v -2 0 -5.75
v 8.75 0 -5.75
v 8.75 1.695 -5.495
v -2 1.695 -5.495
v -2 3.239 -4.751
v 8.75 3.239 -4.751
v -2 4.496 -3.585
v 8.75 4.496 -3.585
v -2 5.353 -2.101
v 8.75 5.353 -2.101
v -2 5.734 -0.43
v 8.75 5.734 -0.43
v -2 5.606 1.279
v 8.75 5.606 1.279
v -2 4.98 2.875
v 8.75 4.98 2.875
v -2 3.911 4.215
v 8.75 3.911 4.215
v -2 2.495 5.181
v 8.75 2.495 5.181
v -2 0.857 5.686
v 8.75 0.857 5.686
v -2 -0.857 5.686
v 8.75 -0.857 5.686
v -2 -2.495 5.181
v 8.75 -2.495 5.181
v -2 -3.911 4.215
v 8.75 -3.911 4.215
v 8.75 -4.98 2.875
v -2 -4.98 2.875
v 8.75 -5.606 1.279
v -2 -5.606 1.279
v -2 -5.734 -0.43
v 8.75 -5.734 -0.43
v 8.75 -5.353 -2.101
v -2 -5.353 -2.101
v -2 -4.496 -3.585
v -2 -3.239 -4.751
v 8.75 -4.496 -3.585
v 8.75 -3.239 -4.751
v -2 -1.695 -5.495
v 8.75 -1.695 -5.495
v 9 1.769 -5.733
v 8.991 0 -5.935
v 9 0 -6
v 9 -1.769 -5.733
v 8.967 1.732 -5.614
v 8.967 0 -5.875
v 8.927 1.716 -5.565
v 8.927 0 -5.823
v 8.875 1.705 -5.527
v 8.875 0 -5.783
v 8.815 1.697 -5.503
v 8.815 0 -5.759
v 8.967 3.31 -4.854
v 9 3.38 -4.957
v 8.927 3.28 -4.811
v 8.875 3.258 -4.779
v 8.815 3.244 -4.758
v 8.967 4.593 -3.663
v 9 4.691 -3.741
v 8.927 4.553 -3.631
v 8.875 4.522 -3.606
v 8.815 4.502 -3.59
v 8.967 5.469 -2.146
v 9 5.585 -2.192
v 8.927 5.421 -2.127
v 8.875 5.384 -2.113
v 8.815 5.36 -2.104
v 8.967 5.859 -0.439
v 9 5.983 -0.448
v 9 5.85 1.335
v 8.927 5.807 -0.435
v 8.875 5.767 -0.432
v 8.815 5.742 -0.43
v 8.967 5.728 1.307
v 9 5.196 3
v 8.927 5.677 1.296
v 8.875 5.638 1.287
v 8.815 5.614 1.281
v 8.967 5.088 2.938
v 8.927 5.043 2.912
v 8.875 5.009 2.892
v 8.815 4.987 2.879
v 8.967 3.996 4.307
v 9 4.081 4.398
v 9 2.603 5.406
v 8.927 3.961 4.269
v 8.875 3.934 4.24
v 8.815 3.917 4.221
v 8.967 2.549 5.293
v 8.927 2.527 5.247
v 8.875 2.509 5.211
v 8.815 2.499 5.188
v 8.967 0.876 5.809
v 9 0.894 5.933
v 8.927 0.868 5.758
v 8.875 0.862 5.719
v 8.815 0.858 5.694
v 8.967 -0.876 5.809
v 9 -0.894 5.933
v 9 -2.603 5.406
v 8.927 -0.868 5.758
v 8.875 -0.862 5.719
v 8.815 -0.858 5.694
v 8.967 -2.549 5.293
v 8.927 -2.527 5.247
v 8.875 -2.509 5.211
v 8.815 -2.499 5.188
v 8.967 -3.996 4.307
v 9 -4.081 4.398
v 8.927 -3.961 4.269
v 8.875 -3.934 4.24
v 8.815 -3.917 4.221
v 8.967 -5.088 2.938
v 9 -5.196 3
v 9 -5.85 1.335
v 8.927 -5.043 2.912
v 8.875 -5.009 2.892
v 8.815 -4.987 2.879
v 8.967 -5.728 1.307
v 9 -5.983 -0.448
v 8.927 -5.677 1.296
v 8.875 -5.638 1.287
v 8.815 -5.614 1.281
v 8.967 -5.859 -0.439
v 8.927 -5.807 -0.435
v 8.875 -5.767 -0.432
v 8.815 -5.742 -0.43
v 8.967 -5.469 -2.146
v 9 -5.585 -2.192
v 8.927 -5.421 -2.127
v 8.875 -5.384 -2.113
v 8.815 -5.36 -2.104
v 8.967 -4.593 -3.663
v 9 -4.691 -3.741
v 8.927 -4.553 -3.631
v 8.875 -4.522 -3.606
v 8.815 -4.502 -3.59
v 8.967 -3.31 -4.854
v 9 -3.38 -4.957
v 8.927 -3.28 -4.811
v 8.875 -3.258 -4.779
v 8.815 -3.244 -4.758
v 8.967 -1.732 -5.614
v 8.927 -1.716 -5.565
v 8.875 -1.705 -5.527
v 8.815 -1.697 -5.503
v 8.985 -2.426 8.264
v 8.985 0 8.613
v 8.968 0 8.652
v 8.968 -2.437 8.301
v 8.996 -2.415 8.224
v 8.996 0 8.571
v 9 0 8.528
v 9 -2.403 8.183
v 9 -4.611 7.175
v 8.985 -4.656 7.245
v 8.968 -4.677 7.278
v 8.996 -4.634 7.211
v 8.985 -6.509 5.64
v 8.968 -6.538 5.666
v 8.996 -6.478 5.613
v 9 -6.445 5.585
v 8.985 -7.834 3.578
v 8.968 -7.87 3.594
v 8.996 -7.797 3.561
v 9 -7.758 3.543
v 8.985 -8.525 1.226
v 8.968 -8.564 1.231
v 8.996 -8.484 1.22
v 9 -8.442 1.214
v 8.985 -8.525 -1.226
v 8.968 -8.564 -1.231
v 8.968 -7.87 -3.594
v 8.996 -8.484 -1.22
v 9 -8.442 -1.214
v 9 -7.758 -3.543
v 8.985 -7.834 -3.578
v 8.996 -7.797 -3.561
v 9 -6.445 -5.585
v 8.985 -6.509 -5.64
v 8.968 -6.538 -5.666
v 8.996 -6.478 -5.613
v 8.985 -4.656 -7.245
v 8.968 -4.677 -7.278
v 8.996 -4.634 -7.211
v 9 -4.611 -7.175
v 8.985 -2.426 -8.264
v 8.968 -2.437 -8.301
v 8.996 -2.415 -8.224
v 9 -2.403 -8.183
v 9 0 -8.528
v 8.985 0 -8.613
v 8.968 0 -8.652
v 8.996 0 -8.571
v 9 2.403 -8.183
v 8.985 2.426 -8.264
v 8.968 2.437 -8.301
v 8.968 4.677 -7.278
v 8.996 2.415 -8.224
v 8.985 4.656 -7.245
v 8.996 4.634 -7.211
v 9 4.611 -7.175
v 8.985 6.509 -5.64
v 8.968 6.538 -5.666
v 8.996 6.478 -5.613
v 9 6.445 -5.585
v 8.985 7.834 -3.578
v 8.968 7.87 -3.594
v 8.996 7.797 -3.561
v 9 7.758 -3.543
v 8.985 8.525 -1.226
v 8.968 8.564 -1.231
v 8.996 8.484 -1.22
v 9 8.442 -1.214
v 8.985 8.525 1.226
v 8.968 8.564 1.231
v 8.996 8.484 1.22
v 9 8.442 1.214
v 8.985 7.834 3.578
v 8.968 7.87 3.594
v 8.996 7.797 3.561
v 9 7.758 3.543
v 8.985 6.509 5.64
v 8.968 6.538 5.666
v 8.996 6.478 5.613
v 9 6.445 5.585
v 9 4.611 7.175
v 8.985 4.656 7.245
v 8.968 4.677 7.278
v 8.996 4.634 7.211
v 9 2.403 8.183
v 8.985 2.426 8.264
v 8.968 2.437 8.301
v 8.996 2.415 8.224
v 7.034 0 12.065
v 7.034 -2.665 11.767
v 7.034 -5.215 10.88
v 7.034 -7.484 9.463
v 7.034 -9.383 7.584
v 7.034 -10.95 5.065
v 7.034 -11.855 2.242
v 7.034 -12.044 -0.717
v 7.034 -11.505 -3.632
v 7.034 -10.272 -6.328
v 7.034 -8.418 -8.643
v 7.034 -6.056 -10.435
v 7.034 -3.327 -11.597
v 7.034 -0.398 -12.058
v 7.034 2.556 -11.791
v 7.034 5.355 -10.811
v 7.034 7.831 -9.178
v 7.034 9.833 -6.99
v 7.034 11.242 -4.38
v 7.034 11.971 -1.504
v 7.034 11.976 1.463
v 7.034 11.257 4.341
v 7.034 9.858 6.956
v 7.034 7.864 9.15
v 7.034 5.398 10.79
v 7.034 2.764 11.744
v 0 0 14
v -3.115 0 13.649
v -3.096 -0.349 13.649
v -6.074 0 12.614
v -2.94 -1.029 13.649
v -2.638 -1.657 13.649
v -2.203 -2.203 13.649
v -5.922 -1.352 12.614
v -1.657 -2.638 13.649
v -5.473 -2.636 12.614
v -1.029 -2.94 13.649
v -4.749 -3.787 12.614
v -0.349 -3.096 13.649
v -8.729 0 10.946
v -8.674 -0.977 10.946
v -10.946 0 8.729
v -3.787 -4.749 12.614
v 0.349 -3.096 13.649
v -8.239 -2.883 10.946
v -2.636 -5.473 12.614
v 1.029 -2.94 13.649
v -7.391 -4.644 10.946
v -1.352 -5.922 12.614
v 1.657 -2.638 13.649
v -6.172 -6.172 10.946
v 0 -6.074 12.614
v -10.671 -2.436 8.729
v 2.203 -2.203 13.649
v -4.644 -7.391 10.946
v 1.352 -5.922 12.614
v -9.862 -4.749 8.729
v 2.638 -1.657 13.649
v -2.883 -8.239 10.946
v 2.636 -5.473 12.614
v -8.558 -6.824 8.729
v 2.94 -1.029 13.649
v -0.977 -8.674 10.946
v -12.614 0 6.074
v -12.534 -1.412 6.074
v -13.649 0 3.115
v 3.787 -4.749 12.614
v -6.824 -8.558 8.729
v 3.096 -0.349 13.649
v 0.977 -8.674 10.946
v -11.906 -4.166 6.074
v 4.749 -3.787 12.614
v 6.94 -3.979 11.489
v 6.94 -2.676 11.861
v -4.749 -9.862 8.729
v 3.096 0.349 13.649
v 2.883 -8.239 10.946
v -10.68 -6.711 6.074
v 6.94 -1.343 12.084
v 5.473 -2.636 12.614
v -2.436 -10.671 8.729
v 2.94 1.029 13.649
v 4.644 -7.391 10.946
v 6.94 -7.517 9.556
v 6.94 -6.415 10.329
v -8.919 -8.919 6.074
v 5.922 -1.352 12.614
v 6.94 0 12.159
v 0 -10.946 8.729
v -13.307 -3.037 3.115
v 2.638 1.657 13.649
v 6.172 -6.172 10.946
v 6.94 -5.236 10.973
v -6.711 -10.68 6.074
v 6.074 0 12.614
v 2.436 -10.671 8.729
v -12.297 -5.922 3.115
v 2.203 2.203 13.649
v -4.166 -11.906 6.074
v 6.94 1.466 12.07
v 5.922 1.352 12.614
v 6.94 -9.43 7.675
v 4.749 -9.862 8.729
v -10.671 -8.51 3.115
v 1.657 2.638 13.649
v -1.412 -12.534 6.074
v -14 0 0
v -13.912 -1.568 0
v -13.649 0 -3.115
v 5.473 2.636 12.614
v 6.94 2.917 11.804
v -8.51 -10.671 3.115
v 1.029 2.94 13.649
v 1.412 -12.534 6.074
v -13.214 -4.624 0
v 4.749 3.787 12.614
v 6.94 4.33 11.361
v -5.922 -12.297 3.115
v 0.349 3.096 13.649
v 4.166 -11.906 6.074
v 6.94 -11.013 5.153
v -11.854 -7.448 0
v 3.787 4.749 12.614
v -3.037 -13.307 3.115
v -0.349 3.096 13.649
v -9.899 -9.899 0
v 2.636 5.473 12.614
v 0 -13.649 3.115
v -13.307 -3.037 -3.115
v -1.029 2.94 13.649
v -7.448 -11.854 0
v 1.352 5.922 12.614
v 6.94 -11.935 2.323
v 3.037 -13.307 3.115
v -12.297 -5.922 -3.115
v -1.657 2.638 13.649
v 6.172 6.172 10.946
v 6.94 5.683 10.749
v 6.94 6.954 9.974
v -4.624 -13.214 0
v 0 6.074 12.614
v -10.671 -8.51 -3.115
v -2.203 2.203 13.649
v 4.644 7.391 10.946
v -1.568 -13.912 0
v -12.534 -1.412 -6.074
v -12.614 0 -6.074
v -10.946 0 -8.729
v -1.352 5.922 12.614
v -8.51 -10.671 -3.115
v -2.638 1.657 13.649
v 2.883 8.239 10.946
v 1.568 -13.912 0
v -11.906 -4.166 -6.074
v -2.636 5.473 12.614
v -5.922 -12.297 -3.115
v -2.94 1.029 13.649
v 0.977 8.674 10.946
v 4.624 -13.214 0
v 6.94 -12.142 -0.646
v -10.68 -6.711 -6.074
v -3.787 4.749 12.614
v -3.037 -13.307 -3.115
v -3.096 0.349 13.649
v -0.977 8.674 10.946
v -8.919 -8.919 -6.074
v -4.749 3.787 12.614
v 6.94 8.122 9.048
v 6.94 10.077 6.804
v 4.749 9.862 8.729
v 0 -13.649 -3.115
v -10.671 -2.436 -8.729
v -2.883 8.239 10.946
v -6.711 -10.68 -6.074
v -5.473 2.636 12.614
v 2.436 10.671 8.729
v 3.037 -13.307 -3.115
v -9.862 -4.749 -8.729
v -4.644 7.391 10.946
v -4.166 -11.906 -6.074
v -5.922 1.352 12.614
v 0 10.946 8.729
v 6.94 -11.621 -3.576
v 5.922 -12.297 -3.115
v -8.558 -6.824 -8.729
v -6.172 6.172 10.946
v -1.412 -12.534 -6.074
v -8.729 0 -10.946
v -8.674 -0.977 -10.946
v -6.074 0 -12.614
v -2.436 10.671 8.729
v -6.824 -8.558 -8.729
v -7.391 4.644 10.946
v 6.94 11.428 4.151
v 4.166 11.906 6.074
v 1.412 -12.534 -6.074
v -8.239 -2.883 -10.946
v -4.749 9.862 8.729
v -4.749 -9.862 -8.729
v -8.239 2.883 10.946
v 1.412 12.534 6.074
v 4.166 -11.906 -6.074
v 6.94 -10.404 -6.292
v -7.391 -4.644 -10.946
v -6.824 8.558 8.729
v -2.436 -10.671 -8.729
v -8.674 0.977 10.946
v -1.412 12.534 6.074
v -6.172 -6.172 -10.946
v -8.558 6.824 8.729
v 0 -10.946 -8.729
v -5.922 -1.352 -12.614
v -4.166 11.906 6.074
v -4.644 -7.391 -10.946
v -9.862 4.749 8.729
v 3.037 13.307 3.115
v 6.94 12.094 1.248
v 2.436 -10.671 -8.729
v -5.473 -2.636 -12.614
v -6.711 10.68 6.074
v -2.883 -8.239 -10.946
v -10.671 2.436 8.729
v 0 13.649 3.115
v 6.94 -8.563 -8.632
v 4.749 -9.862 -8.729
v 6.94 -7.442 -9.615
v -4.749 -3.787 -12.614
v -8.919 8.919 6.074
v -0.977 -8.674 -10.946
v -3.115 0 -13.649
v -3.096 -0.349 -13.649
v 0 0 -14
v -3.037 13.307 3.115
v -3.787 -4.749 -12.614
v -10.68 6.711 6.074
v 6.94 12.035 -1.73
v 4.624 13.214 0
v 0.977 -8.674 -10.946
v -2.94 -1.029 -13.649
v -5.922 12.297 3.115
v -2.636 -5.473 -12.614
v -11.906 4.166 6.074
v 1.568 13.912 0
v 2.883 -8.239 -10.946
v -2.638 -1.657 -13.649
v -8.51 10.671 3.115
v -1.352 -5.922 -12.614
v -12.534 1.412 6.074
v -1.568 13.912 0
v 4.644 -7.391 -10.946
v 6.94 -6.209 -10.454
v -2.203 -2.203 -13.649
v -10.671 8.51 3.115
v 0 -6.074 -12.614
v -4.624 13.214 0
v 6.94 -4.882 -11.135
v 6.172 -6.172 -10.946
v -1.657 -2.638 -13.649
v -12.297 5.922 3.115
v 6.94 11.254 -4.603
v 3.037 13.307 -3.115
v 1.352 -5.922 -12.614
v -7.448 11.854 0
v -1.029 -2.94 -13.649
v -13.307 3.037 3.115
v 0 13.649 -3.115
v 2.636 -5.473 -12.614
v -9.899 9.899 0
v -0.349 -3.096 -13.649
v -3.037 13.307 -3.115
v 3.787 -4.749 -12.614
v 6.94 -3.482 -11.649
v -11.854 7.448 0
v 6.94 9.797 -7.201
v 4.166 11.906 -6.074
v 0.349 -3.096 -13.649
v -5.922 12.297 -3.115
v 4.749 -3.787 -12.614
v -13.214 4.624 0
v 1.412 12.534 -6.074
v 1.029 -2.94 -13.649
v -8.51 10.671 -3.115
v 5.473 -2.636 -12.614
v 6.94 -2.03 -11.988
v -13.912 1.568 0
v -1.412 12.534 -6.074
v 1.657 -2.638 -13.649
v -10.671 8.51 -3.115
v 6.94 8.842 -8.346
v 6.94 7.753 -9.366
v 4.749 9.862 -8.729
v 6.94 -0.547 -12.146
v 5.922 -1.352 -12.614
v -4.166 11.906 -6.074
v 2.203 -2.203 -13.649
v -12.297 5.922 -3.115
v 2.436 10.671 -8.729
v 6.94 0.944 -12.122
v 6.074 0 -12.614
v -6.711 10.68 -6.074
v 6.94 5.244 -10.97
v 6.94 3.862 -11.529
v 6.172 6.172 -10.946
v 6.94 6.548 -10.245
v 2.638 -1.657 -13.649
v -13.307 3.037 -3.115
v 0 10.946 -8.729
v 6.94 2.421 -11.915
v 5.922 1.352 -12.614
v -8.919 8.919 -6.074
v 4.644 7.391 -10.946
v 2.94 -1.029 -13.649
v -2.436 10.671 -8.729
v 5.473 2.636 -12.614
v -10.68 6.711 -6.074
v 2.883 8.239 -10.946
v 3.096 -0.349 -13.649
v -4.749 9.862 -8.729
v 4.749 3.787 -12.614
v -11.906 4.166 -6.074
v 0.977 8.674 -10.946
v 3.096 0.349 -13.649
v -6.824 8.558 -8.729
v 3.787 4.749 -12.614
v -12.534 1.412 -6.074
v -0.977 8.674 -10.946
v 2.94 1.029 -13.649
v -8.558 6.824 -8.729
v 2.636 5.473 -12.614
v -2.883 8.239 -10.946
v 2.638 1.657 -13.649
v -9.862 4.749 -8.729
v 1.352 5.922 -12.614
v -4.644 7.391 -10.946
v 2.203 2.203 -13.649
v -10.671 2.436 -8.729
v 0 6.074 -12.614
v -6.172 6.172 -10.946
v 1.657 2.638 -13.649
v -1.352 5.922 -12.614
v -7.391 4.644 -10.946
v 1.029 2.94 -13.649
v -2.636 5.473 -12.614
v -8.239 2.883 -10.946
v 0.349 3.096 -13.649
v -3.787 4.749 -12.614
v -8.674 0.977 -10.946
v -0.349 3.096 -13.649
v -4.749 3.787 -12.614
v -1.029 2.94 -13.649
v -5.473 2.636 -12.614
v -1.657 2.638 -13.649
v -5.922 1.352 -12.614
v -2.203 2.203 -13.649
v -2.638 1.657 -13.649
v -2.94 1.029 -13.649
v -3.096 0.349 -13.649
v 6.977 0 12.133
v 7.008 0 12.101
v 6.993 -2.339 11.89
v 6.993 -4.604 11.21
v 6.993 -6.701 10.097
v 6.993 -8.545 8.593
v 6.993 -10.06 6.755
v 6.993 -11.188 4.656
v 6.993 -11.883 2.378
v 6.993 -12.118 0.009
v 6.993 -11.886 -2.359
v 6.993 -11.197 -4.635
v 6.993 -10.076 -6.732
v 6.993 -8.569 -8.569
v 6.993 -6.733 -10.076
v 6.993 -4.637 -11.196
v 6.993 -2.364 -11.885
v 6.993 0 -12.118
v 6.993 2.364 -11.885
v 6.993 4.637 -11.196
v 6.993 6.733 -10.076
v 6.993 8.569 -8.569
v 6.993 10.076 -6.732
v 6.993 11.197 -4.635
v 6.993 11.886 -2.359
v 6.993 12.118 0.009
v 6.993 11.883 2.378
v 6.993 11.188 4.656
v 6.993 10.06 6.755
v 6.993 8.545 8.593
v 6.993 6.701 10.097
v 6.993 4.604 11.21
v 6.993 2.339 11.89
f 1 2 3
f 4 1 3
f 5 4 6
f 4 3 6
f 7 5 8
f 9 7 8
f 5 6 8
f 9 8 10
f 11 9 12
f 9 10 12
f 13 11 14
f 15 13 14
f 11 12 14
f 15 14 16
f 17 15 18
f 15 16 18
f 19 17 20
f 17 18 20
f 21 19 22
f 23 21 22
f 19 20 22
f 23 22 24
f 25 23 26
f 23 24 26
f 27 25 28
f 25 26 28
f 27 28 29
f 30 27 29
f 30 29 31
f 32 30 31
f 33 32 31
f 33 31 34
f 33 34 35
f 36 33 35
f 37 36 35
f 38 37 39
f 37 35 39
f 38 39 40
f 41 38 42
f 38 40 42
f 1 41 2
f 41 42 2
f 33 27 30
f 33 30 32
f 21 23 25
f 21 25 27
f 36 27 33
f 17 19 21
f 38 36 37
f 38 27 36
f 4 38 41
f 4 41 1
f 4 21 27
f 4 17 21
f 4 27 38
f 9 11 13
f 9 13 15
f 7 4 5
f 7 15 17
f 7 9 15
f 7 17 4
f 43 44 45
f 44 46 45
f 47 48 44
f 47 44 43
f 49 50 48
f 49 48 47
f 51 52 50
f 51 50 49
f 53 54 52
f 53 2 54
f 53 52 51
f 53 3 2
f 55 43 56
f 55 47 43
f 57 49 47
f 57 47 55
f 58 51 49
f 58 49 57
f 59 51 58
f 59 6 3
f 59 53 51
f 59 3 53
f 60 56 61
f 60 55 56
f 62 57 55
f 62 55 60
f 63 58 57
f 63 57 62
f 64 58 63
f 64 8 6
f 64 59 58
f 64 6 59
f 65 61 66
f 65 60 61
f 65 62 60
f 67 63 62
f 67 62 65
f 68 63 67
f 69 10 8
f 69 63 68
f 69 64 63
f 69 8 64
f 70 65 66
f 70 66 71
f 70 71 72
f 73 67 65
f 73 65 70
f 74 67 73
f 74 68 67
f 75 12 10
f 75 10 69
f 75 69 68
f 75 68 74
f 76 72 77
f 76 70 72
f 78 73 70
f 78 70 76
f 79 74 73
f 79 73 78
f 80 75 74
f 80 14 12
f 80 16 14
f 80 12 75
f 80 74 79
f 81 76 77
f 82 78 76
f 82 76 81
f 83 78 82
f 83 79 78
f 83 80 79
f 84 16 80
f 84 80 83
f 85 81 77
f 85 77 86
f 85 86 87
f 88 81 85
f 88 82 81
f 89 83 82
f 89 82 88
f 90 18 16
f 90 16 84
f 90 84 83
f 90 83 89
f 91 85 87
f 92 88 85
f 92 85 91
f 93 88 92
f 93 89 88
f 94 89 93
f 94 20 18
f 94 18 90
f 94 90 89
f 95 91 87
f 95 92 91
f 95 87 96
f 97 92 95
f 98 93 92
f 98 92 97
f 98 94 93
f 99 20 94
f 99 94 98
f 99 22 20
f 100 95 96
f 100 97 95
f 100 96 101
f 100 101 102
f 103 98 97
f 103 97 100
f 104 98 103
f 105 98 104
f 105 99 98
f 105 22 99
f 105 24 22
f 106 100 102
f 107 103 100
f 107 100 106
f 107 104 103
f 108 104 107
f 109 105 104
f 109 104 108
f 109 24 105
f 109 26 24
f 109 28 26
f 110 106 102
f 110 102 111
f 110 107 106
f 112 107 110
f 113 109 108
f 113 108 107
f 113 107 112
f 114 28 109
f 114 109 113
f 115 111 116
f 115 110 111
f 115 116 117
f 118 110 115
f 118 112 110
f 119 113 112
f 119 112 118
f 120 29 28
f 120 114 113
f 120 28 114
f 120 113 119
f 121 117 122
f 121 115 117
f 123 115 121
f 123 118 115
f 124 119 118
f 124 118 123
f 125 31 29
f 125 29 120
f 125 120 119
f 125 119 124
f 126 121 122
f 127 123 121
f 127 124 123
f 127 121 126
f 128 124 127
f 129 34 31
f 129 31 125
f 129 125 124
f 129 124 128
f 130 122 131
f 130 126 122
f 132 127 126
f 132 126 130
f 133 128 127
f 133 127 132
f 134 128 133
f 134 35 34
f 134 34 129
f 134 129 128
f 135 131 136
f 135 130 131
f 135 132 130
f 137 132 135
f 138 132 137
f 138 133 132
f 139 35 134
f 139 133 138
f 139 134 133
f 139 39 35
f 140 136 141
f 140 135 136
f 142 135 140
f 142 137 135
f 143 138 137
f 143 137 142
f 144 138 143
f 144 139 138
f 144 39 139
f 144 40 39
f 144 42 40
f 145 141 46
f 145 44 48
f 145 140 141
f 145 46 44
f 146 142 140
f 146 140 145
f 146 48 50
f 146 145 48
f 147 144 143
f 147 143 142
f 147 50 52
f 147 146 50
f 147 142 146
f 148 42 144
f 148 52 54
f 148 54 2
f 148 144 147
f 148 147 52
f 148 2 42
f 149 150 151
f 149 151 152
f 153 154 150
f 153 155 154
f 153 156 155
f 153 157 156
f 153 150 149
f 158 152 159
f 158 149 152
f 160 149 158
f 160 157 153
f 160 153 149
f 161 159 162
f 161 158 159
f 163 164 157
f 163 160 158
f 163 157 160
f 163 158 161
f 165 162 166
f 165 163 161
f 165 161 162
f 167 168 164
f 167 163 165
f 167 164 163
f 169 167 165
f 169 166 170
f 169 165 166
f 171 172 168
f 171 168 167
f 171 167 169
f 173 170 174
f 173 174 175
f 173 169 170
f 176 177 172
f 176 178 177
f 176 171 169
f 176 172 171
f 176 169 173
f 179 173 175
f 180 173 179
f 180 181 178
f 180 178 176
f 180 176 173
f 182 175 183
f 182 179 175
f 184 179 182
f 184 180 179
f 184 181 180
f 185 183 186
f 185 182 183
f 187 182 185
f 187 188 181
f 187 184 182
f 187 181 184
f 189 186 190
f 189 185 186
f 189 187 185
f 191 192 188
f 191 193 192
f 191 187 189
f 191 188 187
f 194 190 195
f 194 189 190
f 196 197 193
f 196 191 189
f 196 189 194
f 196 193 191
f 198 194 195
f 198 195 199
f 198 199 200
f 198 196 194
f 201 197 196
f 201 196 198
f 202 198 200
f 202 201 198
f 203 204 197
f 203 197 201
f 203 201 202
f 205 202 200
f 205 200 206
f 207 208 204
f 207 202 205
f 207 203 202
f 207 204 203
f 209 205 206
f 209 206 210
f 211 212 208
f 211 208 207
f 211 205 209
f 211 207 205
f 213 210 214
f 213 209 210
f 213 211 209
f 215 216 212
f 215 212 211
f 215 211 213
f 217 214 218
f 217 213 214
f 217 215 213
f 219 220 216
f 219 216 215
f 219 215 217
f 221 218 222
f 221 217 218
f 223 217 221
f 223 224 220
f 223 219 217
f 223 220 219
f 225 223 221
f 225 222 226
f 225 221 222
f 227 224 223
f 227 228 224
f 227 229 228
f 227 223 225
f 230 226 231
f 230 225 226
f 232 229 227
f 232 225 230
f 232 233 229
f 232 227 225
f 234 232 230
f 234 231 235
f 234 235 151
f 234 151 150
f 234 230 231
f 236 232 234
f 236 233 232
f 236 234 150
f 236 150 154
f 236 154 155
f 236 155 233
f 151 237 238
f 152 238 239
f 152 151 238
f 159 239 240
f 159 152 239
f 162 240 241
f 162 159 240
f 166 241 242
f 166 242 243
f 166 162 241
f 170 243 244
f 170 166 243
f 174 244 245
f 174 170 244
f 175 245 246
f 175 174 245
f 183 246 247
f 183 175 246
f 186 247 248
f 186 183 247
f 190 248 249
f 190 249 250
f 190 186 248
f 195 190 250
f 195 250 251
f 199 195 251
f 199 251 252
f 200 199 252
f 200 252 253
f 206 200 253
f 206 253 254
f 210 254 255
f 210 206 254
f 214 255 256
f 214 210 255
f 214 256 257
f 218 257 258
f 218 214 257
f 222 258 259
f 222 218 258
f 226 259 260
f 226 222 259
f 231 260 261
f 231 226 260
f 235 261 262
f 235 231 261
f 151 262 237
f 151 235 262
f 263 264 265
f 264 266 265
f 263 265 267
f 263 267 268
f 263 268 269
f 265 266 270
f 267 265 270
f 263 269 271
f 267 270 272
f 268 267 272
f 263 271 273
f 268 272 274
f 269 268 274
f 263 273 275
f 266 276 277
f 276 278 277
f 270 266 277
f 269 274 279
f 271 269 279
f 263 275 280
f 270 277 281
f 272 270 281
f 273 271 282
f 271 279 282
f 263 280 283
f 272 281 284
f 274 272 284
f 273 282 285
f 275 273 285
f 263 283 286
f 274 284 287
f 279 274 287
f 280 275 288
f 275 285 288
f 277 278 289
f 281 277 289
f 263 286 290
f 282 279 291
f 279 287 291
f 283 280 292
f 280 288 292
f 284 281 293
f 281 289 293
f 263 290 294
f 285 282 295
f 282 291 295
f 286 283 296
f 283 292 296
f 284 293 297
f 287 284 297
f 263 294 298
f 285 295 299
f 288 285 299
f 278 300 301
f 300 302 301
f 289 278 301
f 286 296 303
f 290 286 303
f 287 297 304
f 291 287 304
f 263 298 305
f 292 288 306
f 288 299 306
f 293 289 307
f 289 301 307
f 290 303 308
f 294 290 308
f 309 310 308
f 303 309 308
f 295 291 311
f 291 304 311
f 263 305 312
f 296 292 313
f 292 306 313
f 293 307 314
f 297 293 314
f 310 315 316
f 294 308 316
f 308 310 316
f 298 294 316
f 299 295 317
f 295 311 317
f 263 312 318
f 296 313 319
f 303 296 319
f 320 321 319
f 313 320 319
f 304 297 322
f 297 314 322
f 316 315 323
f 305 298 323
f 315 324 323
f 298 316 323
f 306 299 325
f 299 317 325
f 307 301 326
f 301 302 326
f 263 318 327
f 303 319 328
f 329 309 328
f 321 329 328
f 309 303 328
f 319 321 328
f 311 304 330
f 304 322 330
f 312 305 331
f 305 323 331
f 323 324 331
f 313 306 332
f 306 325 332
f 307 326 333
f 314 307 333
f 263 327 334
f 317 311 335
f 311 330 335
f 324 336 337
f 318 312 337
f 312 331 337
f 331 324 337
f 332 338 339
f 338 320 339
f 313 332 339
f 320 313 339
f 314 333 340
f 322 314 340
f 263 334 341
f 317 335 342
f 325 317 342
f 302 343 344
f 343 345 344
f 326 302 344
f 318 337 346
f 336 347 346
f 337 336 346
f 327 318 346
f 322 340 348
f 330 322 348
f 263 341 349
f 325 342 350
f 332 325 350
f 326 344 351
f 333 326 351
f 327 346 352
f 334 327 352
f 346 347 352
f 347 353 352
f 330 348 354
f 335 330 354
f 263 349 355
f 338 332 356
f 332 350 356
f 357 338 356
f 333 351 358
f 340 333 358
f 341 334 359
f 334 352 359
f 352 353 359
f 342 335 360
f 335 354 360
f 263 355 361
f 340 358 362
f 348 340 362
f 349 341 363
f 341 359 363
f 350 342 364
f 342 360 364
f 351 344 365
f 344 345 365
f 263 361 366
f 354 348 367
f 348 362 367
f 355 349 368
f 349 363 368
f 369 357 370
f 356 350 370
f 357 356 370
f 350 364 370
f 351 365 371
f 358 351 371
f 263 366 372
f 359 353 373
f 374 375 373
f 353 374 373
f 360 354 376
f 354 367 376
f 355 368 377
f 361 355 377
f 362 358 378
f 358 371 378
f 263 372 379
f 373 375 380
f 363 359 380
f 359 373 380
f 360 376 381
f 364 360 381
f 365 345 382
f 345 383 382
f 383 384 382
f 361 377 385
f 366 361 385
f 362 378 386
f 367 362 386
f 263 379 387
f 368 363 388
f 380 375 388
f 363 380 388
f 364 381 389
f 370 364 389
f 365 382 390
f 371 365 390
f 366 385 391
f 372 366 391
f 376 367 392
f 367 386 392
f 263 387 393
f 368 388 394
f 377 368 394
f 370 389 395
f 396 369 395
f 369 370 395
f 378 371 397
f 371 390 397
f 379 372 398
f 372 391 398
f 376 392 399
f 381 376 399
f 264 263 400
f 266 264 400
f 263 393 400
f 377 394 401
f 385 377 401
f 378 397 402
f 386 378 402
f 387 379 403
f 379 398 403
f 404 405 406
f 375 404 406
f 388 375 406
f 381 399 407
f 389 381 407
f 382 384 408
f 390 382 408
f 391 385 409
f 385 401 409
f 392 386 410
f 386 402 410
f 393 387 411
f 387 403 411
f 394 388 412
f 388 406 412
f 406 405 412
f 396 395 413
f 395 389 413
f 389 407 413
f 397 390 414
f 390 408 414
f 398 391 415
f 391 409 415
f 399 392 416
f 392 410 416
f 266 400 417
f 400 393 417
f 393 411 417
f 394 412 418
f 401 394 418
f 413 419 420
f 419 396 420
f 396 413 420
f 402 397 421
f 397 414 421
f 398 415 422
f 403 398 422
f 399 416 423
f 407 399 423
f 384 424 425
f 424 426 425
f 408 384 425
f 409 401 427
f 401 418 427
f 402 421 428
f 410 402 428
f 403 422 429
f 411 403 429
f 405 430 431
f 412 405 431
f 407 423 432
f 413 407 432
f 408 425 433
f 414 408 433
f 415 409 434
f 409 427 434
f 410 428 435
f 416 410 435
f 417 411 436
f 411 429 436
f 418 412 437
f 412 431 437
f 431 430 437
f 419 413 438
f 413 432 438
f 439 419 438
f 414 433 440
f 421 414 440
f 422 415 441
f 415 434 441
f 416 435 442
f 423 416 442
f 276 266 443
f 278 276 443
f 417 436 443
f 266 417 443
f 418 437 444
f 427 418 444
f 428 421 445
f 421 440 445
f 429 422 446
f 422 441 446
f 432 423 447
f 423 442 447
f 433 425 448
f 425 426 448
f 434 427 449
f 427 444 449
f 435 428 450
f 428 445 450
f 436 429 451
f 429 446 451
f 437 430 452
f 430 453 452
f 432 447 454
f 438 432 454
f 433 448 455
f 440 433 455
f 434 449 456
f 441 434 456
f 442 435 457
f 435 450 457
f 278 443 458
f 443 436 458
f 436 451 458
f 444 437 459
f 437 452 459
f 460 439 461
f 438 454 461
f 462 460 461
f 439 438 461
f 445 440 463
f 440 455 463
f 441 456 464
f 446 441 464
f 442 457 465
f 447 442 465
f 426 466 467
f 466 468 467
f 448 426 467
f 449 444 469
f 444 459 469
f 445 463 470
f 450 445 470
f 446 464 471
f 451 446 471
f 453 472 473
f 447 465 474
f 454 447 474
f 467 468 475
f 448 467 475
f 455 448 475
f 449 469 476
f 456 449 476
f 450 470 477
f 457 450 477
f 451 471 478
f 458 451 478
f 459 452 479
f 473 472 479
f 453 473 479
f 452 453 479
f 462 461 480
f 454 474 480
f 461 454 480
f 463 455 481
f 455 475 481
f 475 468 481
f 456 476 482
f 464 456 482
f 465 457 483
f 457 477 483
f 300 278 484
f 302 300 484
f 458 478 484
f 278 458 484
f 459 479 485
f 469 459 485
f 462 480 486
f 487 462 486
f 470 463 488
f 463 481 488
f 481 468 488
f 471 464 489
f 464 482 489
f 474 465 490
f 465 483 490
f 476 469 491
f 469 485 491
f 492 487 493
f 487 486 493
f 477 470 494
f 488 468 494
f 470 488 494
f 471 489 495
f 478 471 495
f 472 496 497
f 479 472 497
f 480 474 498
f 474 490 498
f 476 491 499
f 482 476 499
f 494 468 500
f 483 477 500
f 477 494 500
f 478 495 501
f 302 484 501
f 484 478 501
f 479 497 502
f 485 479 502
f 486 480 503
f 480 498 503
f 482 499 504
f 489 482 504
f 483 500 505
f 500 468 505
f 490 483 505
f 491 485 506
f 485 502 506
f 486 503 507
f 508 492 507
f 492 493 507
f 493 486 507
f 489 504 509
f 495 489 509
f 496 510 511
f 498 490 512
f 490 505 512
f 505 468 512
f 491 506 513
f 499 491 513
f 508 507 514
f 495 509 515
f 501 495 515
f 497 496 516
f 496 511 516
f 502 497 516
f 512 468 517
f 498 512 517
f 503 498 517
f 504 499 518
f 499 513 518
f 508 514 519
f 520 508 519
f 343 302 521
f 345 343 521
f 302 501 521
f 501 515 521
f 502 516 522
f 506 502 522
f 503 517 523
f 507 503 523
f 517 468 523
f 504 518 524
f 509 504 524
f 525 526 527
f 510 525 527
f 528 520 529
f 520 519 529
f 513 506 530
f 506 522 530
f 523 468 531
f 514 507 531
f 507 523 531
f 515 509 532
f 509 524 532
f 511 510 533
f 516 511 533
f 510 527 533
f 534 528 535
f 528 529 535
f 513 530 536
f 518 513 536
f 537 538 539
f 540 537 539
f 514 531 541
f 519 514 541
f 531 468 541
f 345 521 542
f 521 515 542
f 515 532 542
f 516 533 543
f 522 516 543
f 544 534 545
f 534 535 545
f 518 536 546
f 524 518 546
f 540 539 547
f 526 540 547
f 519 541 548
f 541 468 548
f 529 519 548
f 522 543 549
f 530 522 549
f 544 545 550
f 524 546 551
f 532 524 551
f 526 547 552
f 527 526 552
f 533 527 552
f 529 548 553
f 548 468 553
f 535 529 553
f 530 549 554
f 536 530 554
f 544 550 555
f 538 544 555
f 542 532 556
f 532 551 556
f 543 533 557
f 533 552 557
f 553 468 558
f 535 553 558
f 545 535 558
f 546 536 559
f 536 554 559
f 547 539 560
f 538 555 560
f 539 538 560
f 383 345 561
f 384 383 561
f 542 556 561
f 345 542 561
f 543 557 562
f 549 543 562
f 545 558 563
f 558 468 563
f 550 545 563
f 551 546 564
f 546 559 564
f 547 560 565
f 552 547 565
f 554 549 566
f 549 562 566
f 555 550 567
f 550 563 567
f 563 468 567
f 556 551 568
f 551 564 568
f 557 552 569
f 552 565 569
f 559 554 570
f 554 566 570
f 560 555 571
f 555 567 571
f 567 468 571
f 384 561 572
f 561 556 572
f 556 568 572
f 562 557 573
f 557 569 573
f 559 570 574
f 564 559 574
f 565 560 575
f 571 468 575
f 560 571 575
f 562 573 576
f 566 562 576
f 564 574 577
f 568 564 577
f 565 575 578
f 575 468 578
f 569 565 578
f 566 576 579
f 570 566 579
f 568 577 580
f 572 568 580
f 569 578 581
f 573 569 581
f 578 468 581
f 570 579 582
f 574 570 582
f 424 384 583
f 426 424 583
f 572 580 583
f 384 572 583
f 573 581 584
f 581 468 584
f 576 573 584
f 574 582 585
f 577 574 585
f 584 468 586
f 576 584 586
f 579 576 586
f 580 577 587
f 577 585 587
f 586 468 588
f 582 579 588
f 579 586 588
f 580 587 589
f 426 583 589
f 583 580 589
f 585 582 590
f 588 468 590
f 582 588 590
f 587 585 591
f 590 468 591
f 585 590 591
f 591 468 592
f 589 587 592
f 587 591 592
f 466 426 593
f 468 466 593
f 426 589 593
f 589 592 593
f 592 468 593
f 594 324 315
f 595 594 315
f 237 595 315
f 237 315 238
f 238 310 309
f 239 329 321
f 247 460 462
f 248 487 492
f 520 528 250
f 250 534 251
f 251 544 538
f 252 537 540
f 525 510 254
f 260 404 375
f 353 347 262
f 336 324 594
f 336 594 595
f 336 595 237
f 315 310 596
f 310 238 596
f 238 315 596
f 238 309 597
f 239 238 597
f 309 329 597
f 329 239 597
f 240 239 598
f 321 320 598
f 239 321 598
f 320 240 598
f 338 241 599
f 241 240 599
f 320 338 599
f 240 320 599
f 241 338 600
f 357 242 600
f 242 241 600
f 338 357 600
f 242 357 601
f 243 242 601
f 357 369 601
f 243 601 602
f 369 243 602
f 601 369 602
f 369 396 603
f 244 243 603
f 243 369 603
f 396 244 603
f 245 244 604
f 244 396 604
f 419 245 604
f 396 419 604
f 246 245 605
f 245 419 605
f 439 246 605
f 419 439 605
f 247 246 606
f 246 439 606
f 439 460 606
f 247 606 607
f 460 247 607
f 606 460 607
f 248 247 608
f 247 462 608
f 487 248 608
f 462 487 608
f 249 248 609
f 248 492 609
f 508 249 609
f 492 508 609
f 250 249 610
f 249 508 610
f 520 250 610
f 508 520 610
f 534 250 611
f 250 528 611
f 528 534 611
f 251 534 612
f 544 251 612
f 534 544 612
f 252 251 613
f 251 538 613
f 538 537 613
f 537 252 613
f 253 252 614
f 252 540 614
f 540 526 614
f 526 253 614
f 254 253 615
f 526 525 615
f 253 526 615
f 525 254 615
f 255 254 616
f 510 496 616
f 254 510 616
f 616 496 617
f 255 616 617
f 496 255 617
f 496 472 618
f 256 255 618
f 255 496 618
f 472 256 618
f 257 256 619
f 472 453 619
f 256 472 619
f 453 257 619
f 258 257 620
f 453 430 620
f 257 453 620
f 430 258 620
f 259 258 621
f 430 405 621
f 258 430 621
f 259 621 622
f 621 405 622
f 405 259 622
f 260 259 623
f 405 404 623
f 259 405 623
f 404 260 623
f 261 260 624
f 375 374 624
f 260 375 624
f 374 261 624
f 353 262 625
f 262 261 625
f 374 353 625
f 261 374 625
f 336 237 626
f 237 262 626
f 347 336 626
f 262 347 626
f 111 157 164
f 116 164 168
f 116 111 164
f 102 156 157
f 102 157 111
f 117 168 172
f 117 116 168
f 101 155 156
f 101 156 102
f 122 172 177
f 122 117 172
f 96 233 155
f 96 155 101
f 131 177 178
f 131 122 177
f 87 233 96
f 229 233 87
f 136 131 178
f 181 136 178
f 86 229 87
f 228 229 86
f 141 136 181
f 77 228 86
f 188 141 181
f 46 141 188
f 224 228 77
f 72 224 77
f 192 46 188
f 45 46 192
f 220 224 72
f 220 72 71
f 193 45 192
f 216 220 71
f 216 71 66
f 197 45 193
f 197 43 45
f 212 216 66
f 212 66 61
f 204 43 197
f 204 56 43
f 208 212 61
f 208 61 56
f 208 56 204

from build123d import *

# Parameters (mm, degrees)
SKETCH3_R          = 13.805
CUT_EXTRUDE1_DEPTH = 10
SKETCH4_R          = 5.75
CUT_EXTRUDE2_DEPTH = 11
FILLET1_R          = 0.25


with BuildPart() as part:
    # Sketch1 → Revolve1 (revolve)
    with BuildSketch(Plane(origin=(0, 0, 0), x_dir=(1, 0, 0), z_dir=(0, 1, 0))):
        with BuildLine():
            Line((0, 14), (0, -14))
            ThreePointArc((0, -14), (-14, 0), (0, 14))
        make_face()
    revolve(axis=Axis((0, 0, -14), (0, 0, 1)))

    # Sketch3 → Cut-Extrude1 (cut)
    with BuildSketch(Plane(origin=(9, 0, 0), x_dir=(0, 0, -1), z_dir=(1, 0, 0))):
        Circle(SKETCH3_R)
    extrude(amount=CUT_EXTRUDE1_DEPTH, mode=Mode.SUBTRACT)

    # Sketch4 → Cut-Extrude2 (cut)
    with BuildSketch(Plane(origin=(9, 0, 0), x_dir=(0, 0, -1), z_dir=(1, 0, 0))):
        Circle(SKETCH4_R)
    extrude(amount=-CUT_EXTRUDE2_DEPTH, mode=Mode.SUBTRACT)

    # Sketch6 → Cut-Revolve1 (revolve, cut)
    with BuildSketch(Plane(origin=(0, 0, 0), x_dir=(1, 0, 0), z_dir=(0, 1, 0))):
        Polygon((7, -12.124355653), (9.62, -7.5), (9.62, -12.124355653), align=None)
    revolve(axis=Axis((0, 0, 0), (1, 0, 0)), mode=Mode.SUBTRACT)

    # Fillet1
    fillet1_edges = [part.edges().sort_by_distance(p)[0] for p in [
        (9, 0, 5.75),
        (9, 0, -8.59431317),
        (7, 0, -12.124355653),
    ]]
    fillet(fillet1_edges, radius=FILLET1_R)


solid = part.part
